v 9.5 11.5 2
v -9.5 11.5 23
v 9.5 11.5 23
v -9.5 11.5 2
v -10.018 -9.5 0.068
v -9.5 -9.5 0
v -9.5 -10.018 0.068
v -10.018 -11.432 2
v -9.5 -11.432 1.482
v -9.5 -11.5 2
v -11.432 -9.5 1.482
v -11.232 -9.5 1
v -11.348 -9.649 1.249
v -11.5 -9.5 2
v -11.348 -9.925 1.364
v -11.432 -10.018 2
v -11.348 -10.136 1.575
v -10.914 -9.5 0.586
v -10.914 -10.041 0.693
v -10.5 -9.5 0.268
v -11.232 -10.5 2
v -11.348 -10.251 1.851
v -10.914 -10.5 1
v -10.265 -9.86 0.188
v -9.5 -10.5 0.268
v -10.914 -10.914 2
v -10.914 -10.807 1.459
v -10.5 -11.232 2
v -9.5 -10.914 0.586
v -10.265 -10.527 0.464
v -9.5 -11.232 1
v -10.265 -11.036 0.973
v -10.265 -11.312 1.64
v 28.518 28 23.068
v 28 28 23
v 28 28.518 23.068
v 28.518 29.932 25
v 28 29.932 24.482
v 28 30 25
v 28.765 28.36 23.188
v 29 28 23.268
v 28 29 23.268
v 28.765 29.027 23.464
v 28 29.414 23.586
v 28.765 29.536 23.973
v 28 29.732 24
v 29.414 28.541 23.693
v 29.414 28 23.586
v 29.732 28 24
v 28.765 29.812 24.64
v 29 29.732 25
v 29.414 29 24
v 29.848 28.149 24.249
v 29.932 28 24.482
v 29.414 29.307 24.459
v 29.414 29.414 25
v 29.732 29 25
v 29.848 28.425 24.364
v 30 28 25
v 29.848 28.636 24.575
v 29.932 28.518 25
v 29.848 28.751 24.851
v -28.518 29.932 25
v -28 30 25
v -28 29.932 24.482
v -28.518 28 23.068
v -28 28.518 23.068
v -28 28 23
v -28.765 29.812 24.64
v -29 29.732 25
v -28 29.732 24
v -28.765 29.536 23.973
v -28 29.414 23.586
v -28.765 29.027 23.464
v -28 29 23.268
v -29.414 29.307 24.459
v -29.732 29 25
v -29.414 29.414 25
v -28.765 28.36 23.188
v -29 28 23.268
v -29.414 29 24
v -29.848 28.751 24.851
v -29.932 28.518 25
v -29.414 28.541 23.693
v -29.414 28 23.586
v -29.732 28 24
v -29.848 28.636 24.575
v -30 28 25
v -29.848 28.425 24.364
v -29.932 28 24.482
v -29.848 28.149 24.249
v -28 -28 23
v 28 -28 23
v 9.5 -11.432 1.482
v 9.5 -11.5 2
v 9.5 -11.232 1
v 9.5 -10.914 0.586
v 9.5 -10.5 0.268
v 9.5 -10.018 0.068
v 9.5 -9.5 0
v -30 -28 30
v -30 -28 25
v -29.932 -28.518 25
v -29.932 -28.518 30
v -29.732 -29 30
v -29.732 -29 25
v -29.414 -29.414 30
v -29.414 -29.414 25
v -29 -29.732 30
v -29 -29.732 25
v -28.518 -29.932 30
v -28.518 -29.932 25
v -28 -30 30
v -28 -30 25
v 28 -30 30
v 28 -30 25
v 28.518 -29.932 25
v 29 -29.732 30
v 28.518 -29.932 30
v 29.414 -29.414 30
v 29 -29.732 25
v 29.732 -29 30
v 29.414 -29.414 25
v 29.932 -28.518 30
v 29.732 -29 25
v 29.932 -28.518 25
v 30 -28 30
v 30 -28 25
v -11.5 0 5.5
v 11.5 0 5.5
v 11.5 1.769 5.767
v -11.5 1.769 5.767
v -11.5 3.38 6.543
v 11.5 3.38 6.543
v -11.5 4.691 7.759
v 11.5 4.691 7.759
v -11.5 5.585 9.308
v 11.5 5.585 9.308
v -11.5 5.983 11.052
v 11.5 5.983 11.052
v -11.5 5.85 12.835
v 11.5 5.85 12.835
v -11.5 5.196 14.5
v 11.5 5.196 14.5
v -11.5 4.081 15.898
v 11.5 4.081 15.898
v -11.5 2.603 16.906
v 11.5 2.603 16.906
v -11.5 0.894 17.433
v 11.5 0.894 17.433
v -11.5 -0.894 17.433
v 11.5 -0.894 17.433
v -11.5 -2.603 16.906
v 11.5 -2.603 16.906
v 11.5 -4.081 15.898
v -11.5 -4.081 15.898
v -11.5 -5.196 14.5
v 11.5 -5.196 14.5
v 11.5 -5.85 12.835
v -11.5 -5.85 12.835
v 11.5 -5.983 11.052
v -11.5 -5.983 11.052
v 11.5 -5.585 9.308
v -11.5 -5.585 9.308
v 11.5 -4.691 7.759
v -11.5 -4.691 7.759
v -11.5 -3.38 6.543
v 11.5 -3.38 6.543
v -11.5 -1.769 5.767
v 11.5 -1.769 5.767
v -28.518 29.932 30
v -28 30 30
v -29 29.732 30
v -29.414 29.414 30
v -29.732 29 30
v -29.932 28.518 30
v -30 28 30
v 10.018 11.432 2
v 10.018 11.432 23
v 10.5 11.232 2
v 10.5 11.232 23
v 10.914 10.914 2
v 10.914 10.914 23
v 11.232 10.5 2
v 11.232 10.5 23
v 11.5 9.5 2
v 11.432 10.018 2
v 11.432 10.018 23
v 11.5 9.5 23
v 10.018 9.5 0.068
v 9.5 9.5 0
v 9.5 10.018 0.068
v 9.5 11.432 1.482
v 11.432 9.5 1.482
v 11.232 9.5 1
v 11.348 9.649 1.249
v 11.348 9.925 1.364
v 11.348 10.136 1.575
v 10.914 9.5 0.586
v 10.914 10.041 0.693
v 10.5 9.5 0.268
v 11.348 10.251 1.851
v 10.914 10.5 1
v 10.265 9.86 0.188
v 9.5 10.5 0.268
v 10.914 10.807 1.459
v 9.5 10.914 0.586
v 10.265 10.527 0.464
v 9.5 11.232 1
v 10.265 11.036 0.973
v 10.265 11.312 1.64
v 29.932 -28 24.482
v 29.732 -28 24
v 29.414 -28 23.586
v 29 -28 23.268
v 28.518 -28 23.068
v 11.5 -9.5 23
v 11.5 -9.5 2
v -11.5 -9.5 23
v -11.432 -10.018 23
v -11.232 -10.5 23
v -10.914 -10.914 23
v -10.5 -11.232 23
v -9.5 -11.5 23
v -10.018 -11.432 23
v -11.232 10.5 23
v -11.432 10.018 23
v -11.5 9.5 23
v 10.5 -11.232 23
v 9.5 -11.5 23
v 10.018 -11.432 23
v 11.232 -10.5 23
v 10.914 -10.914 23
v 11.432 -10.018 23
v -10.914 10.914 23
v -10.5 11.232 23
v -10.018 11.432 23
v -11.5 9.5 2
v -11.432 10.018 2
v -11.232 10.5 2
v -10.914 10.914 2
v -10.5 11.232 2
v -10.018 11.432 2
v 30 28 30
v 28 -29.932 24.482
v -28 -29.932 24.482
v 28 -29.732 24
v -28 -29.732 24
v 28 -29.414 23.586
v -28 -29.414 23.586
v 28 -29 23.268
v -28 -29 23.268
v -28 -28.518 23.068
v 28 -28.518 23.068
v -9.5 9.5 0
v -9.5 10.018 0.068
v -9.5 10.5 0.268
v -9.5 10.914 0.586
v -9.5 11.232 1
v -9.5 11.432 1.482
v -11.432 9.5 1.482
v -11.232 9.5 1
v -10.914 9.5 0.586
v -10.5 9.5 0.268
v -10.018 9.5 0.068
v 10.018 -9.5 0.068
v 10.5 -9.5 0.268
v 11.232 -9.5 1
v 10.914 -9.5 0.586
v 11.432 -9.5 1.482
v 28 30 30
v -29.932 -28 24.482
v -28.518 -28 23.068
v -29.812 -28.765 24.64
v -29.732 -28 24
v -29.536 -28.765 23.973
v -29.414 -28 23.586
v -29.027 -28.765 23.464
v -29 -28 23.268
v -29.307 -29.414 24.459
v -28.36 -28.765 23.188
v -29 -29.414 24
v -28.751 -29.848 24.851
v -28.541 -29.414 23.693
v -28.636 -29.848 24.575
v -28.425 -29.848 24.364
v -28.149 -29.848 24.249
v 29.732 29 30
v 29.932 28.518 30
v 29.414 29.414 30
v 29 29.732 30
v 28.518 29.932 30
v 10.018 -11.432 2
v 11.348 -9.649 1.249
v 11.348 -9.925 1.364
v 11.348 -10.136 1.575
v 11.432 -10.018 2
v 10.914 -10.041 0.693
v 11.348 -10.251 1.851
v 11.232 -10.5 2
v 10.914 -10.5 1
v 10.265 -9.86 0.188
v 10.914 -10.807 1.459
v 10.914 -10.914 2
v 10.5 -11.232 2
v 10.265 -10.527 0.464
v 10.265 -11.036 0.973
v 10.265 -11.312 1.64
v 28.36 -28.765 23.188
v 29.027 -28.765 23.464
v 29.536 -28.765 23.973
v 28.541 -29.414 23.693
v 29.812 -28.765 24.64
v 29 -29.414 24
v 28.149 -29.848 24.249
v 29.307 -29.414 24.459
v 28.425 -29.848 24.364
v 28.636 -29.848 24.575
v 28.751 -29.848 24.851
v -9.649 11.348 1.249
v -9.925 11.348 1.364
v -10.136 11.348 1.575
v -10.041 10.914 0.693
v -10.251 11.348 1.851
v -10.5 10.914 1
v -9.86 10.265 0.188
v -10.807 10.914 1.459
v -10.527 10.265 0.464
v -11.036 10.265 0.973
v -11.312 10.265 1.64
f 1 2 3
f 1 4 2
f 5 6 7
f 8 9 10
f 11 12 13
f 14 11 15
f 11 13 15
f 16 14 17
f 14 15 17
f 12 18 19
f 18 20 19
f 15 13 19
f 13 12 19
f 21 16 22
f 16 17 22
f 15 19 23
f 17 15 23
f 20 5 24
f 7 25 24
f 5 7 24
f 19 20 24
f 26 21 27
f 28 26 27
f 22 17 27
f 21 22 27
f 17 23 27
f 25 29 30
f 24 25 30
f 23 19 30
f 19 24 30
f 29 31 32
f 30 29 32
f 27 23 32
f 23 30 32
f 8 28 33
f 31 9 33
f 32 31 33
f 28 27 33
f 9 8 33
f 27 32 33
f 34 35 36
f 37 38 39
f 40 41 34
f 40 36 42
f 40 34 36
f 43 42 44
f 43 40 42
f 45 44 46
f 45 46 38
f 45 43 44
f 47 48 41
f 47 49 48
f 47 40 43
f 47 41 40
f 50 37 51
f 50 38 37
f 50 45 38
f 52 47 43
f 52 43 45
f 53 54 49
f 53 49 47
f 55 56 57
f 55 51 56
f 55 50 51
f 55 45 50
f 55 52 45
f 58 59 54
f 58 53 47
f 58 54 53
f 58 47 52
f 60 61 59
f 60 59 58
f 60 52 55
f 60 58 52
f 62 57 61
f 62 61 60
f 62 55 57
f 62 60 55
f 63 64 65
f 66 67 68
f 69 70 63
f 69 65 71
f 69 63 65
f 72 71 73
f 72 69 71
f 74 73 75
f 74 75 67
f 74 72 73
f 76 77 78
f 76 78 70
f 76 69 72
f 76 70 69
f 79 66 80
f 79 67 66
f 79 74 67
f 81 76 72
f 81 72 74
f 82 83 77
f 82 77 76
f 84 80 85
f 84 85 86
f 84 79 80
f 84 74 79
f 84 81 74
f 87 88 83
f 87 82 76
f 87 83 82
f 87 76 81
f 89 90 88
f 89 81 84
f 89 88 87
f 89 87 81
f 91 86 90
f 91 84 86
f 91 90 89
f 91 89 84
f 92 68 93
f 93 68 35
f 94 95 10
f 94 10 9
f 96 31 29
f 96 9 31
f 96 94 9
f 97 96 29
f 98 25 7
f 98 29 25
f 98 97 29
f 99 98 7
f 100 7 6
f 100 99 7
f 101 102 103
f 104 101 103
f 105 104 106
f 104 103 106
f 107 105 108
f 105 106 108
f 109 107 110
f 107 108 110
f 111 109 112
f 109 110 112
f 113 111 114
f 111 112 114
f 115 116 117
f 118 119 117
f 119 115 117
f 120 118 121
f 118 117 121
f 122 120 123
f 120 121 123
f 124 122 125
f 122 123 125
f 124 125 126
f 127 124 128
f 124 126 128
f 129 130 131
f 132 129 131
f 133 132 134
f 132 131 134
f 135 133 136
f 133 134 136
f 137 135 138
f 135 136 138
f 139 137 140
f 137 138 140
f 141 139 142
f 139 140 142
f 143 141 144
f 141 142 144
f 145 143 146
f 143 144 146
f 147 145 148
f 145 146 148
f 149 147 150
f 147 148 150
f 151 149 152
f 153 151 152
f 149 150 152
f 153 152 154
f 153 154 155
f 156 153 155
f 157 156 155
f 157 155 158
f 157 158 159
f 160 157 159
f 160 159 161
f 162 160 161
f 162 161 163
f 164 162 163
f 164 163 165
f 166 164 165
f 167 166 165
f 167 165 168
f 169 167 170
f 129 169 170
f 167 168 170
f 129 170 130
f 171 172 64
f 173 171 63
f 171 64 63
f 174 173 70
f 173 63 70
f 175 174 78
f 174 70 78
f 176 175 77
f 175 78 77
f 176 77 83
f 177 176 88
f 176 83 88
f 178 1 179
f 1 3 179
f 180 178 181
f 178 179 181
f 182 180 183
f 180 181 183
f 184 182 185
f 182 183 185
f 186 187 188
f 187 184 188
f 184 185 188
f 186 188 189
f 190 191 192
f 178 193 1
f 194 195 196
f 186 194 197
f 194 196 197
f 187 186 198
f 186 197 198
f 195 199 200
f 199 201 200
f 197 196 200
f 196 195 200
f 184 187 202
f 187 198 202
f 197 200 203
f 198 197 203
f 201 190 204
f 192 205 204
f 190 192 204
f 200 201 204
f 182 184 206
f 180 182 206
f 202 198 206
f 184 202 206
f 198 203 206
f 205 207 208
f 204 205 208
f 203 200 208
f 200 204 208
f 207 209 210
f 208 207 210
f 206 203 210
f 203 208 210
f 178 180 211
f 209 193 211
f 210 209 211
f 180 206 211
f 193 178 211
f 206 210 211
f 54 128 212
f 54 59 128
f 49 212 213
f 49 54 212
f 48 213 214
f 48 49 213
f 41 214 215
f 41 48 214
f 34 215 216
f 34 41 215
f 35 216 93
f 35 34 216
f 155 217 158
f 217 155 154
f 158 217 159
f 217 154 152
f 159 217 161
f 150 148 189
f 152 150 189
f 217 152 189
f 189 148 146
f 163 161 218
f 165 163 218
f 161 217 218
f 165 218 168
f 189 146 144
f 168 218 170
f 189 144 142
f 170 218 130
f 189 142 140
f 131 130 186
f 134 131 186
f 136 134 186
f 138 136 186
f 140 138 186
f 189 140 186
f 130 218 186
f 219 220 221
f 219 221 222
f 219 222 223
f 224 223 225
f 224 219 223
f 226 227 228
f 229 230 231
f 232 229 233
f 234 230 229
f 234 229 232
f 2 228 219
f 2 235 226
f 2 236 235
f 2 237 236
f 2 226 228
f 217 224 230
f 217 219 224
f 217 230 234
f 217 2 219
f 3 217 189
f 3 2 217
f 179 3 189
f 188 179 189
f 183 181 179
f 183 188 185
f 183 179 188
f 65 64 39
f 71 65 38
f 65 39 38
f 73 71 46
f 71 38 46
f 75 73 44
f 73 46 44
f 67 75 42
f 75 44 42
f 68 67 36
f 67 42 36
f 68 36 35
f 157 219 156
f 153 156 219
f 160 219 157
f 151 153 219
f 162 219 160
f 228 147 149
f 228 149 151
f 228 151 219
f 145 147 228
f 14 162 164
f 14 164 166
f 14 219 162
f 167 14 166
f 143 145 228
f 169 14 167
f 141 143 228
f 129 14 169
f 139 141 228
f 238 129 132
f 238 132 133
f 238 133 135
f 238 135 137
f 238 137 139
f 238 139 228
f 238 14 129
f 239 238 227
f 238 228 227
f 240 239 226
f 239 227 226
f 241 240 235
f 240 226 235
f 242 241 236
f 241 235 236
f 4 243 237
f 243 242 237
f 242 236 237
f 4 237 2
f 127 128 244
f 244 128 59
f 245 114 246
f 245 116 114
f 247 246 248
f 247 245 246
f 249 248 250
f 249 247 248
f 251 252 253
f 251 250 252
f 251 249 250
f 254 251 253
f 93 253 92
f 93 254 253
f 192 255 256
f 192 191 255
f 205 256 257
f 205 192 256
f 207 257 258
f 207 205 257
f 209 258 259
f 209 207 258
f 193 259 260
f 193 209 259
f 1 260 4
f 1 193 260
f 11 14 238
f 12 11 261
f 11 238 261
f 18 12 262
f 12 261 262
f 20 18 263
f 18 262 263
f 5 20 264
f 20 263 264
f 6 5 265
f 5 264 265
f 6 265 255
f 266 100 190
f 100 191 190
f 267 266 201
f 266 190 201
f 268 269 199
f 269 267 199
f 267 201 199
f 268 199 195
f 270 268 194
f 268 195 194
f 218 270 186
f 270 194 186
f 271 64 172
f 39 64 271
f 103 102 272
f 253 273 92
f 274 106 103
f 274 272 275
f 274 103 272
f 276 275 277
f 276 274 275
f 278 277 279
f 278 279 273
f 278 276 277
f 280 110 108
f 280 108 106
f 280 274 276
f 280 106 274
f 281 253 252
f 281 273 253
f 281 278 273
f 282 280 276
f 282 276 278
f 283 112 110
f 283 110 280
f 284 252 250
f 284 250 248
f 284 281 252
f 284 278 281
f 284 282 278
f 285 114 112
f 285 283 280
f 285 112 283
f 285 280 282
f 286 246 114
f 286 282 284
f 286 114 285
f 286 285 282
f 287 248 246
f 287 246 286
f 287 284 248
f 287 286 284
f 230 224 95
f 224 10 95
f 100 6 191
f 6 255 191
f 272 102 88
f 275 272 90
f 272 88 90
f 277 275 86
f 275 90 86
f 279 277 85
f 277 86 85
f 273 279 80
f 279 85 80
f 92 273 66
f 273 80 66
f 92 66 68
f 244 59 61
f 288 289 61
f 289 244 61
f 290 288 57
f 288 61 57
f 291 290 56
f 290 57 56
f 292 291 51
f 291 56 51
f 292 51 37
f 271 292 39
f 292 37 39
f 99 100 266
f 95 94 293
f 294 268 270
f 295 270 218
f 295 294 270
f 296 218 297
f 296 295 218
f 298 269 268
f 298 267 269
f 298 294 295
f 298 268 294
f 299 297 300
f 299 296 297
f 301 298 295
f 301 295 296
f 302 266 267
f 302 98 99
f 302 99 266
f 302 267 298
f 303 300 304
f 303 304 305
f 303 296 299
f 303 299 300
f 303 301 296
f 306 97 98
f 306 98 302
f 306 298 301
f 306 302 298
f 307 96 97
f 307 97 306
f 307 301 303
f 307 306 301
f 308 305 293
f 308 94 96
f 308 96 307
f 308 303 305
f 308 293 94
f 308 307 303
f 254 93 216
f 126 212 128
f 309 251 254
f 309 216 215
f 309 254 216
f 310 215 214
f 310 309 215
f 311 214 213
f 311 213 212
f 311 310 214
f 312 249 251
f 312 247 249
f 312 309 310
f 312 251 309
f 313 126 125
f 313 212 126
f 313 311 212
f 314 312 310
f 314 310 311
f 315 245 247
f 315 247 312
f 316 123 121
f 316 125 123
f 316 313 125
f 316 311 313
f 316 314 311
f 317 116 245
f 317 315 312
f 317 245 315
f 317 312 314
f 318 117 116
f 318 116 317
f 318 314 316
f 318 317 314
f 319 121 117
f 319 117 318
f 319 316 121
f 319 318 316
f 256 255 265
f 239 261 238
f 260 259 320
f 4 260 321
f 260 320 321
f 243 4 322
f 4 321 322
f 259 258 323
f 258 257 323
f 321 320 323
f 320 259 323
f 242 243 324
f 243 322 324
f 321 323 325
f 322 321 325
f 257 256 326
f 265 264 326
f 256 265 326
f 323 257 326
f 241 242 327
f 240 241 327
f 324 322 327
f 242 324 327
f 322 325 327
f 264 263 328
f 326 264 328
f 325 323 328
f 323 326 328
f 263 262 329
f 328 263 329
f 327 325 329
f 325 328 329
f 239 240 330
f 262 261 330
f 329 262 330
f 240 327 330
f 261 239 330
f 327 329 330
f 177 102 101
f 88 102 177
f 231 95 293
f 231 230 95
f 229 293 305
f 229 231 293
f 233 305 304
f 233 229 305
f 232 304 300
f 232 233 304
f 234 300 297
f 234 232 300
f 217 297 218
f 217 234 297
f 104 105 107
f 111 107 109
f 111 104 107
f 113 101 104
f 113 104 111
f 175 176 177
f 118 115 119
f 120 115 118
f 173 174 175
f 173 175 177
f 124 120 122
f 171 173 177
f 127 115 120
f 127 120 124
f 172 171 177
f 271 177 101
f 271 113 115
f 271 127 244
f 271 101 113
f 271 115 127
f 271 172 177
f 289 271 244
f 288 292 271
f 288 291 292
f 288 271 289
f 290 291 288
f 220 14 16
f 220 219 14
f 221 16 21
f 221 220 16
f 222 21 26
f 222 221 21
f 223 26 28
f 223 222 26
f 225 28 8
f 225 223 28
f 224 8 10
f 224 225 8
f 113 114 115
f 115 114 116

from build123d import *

# Parameters (mm, degrees)
ESBO_O1_W                = 23
ESBO_O1_H                = 23
RESSALTO_EXTRUS_O1_DEPTH = 23
ESBO_O3_W                = 60
ESBO_O3_H                = 60
RESSALTO_EXTRUS_O2_DEPTH = 7
ESBO_O6_R                = 6
CORTE_EXTRUS_O1_DEPTH    = 23
FILETE1_R                = 2
FILETE2_R                = 2
FILETE3_R                = 2


with BuildPart() as part:
    # Esboço1 → Ressalto-extrusão1 (new body)
    with BuildSketch(Plane.XY):
        Rectangle(ESBO_O1_W, ESBO_O1_H)
    extrude(amount=RESSALTO_EXTRUS_O1_DEPTH)

    # Esboço6 → Corte-extrusão1 (cut)
    with BuildSketch(Plane(origin=(11.5, 0, 0), x_dir=(0, 0, -1), z_dir=(1, 0, 0))):
        with Locations((-11.5, 0)):
            Circle(ESBO_O6_R)
    extrude(amount=-CORTE_EXTRUS_O1_DEPTH, mode=Mode.SUBTRACT)

    # Filete3
    filete3_edges = [part.edges().sort_by_distance(p)[0] for p in [
        (0, -11.5, 0),
        (-11.5, 0, 0),
        (0, 11.5, 0),
        (11.5, 0, 0),
        (11.5, -11.5, 11.5),
        (-11.5, -11.5, 11.5),
        (-11.5, 11.5, 11.5),
        (11.5, 11.5, 11.5),
    ]]
    fillet(filete3_edges, radius=FILETE3_R)


with BuildPart() as body_2:
    # Esboço3 → Ressalto-extrusão2 (new body)
    with BuildSketch(Plane.XY.offset(23)):
        Rectangle(ESBO_O3_W, ESBO_O3_H)
    extrude(amount=RESSALTO_EXTRUS_O2_DEPTH)

    # Filete1
    filete1_edges = [body_2.edges().sort_by_distance(p)[0] for p in [
        (0, 30, 23),
        (30, 0, 23),
        (0, -30, 23),
        (-30, 0, 23),
    ]]
    fillet(filete1_edges, radius=FILETE1_R)

    # Filete2
    # the kernel refuses this fillet: 2 mm, written as the material it takes off along each edge
    with BuildSketch(Plane(origin=(-28, -28, 25), x_dir=(-1, 0, 0), z_dir=(0, -1, 0))) as filete2_piece_1_section:
        Polygon((0, 0), (FILETE2_R, 0), (FILETE2_R, FILETE2_R), (0, FILETE2_R), align=None)
    filete2_piece_1 = extrude(amount=FILETE2_R, mode=Mode.PRIVATE)
    filete2_piece_1 = filete2_piece_1 - Plane(origin=(-28, -28, 25), x_dir=(0.7071067811865475, 0, 0.7071067811865475), z_dir=(0, -1, 0)) * Sphere(FILETE2_R, mode=Mode.PRIVATE)
    add(filete2_piece_1, mode=Mode.SUBTRACT)
    with BuildSketch(Plane(origin=(-28, 28, 25), x_dir=(0, 1, 0), z_dir=(-1, 0, 0))) as filete2_piece_2_section:
        Polygon((0, 0), (FILETE2_R, 0), (FILETE2_R, FILETE2_R), (0, FILETE2_R), align=None)
    filete2_piece_2 = extrude(amount=FILETE2_R, mode=Mode.PRIVATE)
    filete2_piece_2 = filete2_piece_2 - Plane(origin=(-28, 28, 25), x_dir=(0, -0.7071067811865475, 0.7071067811865475), z_dir=(-1, 0, 0)) * Sphere(FILETE2_R, mode=Mode.PRIVATE)
    add(filete2_piece_2, mode=Mode.SUBTRACT)
    with BuildSketch(Plane(origin=(28, -28, 25), x_dir=(1, 0, 0), z_dir=(0, -1, 0))) as filete2_piece_3_section:
        Polygon((0, 0), (FILETE2_R, 0), (FILETE2_R, -FILETE2_R), (0, -FILETE2_R), align=None)
    filete2_piece_3 = extrude(amount=FILETE2_R, mode=Mode.PRIVATE)
    filete2_piece_3 = filete2_piece_3 - Plane(origin=(28, -28, 25), x_dir=(-0.7071067811865475, 0, 0.7071067811865475), z_dir=(0, -1, 0)) * Sphere(FILETE2_R, mode=Mode.PRIVATE)
    add(filete2_piece_3, mode=Mode.SUBTRACT)
    with BuildSketch(Plane(origin=(28, 28, 25), x_dir=(0, 1, 0), z_dir=(1, 0, 0))) as filete2_piece_4_section:
        Polygon((0, 0), (FILETE2_R, 0), (FILETE2_R, -FILETE2_R), (0, -FILETE2_R), align=None)
    filete2_piece_4 = extrude(amount=FILETE2_R, mode=Mode.PRIVATE)
    filete2_piece_4 = filete2_piece_4 - Plane(origin=(28, 28, 25), x_dir=(0, -0.7071067811865475, 0.7071067811865475), z_dir=(1, 0, 0)) * Sphere(FILETE2_R, mode=Mode.PRIVATE)
    add(filete2_piece_4, mode=Mode.SUBTRACT)
    with BuildSketch(Plane(origin=(-30, 30, 25), x_dir=(0, -1, 0), z_dir=(0, 0, 1)), Plane(origin=(-30, -30, 25), x_dir=(1, 0, 0), z_dir=(0, 0, 1))) as filete2_piece_5:
        with BuildLine():
            CenterArc((FILETE2_R, FILETE2_R), FILETE2_R, 180, 90)
            Line((0, FILETE2_R), (0, 0))
            Line((0, 0), (FILETE2_R, 0))
        make_face()
    extrude(amount=10, mode=Mode.SUBTRACT)
    with BuildSketch(Plane(origin=(30, 30, 25), x_dir=(0, -1, 0), z_dir=(0, 0, 1)), Plane(origin=(30, -30, 25), x_dir=(-1, 0, 0), z_dir=(0, 0, 1))) as filete2_piece_6:
        with BuildLine():
            CenterArc((FILETE2_R, -FILETE2_R), FILETE2_R, 90, 90)
            Line((0, -FILETE2_R), (0, 0))
            Line((0, 0), (FILETE2_R, 0))
        make_face()
    extrude(amount=10, mode=Mode.SUBTRACT)


solid = Compound([part.part, body_2.part])
